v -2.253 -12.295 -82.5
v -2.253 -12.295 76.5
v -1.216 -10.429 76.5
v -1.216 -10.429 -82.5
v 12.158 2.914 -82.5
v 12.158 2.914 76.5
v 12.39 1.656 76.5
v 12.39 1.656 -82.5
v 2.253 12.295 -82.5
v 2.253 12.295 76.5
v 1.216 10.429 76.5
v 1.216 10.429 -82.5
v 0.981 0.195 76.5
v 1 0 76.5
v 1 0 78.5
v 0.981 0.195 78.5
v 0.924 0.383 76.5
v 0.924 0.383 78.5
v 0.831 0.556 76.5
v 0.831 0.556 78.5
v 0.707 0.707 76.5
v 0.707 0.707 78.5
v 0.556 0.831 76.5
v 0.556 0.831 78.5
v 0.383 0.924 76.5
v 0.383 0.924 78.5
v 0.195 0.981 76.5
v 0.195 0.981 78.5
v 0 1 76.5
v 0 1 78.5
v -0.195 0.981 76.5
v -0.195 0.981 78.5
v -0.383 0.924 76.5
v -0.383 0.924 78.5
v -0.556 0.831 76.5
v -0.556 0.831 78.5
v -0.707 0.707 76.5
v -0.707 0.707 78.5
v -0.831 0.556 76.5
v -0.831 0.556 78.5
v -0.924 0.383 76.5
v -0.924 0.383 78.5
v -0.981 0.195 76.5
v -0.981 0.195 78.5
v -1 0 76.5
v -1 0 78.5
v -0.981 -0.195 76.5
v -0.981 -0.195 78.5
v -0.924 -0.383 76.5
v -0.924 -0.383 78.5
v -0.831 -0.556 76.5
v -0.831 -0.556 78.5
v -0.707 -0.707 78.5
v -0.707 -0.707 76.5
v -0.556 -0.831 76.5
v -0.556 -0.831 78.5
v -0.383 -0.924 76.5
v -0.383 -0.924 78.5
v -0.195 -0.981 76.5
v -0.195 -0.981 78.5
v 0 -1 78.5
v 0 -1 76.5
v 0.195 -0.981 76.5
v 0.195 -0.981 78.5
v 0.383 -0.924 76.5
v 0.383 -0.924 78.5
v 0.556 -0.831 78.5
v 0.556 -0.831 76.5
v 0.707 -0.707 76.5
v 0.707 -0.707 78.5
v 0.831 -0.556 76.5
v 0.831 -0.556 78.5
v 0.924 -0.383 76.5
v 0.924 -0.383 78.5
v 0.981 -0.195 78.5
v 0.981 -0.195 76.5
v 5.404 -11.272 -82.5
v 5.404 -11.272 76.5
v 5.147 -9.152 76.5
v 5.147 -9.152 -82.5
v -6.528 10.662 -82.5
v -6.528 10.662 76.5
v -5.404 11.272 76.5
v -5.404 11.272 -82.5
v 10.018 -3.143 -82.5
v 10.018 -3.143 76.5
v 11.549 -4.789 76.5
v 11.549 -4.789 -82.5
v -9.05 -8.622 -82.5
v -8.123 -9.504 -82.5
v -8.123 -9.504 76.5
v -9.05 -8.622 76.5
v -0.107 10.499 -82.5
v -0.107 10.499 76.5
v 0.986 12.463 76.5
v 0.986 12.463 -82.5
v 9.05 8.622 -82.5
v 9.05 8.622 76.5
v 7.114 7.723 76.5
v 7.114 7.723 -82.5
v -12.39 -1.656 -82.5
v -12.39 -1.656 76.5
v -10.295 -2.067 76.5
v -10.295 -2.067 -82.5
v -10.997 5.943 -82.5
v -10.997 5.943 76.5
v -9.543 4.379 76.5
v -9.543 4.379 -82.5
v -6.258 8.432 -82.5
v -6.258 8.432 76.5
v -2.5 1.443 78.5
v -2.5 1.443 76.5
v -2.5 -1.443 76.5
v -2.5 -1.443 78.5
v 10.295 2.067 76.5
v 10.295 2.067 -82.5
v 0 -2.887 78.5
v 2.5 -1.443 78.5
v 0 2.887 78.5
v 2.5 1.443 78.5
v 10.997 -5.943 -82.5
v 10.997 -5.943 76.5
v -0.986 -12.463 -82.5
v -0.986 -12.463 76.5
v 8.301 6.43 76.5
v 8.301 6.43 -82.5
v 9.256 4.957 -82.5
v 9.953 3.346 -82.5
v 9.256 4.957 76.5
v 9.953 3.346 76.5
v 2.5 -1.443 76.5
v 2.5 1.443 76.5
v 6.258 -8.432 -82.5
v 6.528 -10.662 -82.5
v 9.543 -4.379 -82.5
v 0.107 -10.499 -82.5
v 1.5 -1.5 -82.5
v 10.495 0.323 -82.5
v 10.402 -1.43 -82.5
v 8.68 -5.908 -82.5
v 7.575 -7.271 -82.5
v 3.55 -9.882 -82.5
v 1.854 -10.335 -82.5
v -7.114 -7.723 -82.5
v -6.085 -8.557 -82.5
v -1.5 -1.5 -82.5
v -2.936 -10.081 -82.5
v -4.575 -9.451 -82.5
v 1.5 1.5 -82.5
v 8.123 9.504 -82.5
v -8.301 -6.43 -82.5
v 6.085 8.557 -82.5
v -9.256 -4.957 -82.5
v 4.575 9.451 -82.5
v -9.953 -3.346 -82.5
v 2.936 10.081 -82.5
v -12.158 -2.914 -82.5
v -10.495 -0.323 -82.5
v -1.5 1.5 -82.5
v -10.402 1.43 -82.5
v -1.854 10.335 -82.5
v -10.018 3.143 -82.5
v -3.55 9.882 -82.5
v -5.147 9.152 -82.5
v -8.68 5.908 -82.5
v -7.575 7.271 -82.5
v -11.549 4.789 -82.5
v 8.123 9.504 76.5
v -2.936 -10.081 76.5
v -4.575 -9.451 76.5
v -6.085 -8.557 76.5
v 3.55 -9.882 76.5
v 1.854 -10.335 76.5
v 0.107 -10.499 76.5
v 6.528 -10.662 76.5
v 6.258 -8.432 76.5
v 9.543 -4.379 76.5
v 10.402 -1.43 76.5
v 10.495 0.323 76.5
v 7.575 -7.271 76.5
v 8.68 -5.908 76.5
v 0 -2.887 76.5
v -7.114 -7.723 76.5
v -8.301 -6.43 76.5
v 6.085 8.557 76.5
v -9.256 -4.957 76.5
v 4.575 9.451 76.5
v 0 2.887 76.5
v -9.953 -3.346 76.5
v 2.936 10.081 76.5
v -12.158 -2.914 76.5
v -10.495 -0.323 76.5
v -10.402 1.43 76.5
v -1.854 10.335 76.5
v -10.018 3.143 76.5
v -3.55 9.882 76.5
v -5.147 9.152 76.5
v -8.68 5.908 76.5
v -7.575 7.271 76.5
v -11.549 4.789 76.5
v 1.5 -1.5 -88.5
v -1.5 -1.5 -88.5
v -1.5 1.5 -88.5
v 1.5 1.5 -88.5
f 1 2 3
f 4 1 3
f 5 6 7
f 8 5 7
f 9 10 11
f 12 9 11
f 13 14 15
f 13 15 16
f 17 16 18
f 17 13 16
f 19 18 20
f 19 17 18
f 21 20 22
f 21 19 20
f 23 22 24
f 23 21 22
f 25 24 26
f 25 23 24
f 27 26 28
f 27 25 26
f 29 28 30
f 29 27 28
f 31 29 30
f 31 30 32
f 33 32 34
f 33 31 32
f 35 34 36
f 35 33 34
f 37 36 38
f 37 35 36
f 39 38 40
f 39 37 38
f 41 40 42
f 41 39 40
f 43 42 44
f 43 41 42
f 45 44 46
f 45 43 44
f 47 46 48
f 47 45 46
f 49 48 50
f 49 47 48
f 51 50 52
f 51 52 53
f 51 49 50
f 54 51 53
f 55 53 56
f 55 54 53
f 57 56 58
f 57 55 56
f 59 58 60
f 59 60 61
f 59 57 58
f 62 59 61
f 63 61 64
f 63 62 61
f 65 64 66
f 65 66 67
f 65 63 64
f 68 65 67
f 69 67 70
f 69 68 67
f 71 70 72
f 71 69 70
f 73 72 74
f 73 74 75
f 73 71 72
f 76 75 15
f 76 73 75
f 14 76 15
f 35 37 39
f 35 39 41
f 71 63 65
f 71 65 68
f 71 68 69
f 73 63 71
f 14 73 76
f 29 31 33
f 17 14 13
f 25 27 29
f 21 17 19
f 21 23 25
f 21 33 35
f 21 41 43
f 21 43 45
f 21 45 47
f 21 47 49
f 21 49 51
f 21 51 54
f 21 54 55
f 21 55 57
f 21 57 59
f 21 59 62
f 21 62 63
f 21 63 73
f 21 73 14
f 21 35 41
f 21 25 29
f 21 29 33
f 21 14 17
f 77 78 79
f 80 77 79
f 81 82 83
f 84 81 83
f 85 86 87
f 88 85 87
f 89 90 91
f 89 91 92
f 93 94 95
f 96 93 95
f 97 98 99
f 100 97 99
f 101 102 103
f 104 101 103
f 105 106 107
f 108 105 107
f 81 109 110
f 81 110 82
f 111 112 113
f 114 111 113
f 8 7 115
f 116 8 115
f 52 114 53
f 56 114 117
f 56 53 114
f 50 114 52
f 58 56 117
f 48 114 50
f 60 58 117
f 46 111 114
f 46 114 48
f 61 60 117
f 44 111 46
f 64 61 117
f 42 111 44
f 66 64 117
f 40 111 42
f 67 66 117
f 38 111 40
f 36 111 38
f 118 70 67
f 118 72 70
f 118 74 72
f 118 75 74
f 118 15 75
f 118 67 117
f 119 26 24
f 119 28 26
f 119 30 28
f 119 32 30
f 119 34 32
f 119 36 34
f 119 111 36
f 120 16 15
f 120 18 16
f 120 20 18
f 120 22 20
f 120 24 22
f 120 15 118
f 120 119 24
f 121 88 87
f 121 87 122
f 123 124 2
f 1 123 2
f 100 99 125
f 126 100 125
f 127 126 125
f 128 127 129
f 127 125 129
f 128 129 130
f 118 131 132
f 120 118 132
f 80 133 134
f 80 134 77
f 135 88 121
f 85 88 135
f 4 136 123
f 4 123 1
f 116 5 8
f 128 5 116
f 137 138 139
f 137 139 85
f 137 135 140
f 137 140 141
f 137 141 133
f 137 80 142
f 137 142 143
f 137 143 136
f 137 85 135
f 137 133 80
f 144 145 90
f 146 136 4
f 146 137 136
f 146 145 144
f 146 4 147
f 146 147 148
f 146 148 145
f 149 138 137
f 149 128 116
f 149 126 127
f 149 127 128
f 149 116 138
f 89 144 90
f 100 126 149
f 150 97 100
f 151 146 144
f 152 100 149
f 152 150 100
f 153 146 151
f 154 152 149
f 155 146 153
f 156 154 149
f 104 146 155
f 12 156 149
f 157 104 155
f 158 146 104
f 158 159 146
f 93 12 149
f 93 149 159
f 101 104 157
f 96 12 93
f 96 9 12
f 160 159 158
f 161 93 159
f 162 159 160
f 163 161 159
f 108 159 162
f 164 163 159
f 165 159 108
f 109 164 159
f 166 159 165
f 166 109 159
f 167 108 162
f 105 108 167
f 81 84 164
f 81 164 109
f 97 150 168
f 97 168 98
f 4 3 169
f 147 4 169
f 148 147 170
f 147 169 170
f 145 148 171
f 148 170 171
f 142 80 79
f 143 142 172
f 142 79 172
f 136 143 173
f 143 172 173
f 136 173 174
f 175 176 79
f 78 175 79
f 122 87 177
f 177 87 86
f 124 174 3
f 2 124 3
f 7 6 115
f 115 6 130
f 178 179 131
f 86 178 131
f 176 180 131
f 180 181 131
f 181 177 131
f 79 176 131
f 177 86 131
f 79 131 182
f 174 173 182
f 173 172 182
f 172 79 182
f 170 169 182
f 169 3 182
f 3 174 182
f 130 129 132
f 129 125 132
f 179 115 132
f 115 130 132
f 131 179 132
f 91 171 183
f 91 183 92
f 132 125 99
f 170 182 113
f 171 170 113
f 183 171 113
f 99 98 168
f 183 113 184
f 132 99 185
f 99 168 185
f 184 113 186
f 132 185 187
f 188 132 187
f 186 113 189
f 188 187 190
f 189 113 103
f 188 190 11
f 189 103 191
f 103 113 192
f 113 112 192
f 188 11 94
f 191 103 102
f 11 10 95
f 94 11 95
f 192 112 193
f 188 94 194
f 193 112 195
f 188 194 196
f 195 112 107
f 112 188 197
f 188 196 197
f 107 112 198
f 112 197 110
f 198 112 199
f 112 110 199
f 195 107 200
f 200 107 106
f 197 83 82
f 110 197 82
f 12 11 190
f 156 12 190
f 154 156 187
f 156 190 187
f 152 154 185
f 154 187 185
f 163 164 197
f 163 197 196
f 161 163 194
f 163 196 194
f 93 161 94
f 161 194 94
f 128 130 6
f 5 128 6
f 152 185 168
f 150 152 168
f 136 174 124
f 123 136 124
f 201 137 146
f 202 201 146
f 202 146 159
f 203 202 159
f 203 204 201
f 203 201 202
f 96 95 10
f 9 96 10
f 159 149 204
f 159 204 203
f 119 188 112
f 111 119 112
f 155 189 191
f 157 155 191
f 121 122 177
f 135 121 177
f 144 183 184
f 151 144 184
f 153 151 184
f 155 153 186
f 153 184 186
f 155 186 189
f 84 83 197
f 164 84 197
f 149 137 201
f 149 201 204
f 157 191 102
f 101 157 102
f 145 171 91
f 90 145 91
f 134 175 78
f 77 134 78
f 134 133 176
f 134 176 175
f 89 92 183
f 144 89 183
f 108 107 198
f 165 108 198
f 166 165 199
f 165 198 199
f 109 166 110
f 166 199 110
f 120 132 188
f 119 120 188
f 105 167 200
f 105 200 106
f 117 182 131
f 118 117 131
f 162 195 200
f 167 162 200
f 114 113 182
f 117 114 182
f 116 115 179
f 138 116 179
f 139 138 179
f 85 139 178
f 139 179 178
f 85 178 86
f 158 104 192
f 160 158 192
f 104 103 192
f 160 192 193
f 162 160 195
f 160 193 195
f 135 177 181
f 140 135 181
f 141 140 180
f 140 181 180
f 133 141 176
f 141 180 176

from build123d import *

# Parameters (mm, degrees)
SKETCH1_R           = 10.5
BOSS_EXTRUDE1_DEPTH = 76.5
SKETCH3_W           = 3
SKETCH3_H           = 3
BOSS_EXTRUDE2_DEPTH = 12
SKETCH4_R           = 1
BOSS_EXTRUDE3_DEPTH = 2
SKETCH7_R           = 10.5
SKETCH7_W           = 3
SKETCH7_H           = 3
BOSS_EXTRUDE4_DEPTH = 6
BOSS_EXTRUDE5_DEPTH = 159


with BuildPart() as part:
    # Sketch1 → Boss-Extrude1 (new, symmetric)
    with BuildSketch(Plane.XY):
        Circle(SKETCH1_R)
    extrude(amount=BOSS_EXTRUDE1_DEPTH, both=True)

    # Sketch3 → Boss-Extrude2 (add)
    with BuildSketch(Plane(origin=(0, 0, -76.5), x_dir=(-1, 0, 0), z_dir=(0, 0, -1))):
        Rectangle(SKETCH3_W, SKETCH3_H)
    extrude(amount=BOSS_EXTRUDE2_DEPTH)

    # Sketch4 → Boss-Extrude3 (add)
    with BuildSketch(Plane.XY.offset(76.5)):
        Polygon((0, 2.886751346), (-2.5, 1.443375673), (-2.5, -1.443375673), (0, -2.886751346), (2.5, -1.443375673), (2.5, 1.443375673), align=None)
        Circle(SKETCH4_R, mode=Mode.SUBTRACT)
    extrude(amount=BOSS_EXTRUDE3_DEPTH)

    # Sketch7 → Boss-Extrude4 (add)
    with BuildSketch(Plane(origin=(0, 0, -76.5), x_dir=(-1, 0, 0), z_dir=(0, 0, -1))):
        Circle(SKETCH7_R)
        Rectangle(SKETCH7_W, SKETCH7_H, mode=Mode.SUBTRACT)
    extrude(amount=BOSS_EXTRUDE4_DEPTH)

    # Sketch8 → Boss-Extrude5 (add)
    with BuildSketch(Plane.XY.offset(76.5)):
        Polygon((-0.228880958, 10.279411866), (0.985593436, 12.463206486), (2.253499249, 12.295191789), (1.036282986, 10.106466905), align=None)
        Polygon((9.050051597, 8.622445482), (6.778802746, 7.567191623), (5.856918112, 8.450751744), (8.123050808, 9.503628565), align=None)
        Polygon((12.389791835, 1.656218067), (9.93205026, 2.137506341), (9.705573533, 3.394191686), (12.157778863, 2.913987549), align=None)
        Polygon((10.997052705, -5.942628357), (9.291592153, -4.108633713), (9.847029745, -2.958834232), (11.548648621, -4.788697668), align=None)
        Polygon((5.403813218, -11.271592731), (5.102061653, -8.785415336), (6.227255282, -8.18168604), (6.52832713, -10.662263138), align=None)
        Polygon((-2.253499249, -12.295191789), (-1.036282986, -10.106466905), (0.228880958, -10.279411866), (-0.985593436, -12.463206486), align=None)
        Polygon((-9.050051597, -8.622445482), (-6.778802746, -7.567191623), (-5.856918112, -8.450751744), (-8.123050808, -9.503628565), align=None)
        Polygon((-12.389791835, -1.656218067), (-9.93205026, -2.137506341), (-9.705573533, -3.394191686), (-12.157778863, -2.913987549), align=None)
        Polygon((-10.997052705, 5.942628357), (-9.291592153, 4.108633713), (-9.847029745, 2.958834232), (-11.548648621, 4.788697668), align=None)
        Polygon((-5.403813218, 11.271592731), (-5.102061653, 8.785415336), (-6.227255282, 8.18168604), (-6.52832713, 10.662263138), align=None)
    extrude(amount=-BOSS_EXTRUDE5_DEPTH)


solid = part.part
